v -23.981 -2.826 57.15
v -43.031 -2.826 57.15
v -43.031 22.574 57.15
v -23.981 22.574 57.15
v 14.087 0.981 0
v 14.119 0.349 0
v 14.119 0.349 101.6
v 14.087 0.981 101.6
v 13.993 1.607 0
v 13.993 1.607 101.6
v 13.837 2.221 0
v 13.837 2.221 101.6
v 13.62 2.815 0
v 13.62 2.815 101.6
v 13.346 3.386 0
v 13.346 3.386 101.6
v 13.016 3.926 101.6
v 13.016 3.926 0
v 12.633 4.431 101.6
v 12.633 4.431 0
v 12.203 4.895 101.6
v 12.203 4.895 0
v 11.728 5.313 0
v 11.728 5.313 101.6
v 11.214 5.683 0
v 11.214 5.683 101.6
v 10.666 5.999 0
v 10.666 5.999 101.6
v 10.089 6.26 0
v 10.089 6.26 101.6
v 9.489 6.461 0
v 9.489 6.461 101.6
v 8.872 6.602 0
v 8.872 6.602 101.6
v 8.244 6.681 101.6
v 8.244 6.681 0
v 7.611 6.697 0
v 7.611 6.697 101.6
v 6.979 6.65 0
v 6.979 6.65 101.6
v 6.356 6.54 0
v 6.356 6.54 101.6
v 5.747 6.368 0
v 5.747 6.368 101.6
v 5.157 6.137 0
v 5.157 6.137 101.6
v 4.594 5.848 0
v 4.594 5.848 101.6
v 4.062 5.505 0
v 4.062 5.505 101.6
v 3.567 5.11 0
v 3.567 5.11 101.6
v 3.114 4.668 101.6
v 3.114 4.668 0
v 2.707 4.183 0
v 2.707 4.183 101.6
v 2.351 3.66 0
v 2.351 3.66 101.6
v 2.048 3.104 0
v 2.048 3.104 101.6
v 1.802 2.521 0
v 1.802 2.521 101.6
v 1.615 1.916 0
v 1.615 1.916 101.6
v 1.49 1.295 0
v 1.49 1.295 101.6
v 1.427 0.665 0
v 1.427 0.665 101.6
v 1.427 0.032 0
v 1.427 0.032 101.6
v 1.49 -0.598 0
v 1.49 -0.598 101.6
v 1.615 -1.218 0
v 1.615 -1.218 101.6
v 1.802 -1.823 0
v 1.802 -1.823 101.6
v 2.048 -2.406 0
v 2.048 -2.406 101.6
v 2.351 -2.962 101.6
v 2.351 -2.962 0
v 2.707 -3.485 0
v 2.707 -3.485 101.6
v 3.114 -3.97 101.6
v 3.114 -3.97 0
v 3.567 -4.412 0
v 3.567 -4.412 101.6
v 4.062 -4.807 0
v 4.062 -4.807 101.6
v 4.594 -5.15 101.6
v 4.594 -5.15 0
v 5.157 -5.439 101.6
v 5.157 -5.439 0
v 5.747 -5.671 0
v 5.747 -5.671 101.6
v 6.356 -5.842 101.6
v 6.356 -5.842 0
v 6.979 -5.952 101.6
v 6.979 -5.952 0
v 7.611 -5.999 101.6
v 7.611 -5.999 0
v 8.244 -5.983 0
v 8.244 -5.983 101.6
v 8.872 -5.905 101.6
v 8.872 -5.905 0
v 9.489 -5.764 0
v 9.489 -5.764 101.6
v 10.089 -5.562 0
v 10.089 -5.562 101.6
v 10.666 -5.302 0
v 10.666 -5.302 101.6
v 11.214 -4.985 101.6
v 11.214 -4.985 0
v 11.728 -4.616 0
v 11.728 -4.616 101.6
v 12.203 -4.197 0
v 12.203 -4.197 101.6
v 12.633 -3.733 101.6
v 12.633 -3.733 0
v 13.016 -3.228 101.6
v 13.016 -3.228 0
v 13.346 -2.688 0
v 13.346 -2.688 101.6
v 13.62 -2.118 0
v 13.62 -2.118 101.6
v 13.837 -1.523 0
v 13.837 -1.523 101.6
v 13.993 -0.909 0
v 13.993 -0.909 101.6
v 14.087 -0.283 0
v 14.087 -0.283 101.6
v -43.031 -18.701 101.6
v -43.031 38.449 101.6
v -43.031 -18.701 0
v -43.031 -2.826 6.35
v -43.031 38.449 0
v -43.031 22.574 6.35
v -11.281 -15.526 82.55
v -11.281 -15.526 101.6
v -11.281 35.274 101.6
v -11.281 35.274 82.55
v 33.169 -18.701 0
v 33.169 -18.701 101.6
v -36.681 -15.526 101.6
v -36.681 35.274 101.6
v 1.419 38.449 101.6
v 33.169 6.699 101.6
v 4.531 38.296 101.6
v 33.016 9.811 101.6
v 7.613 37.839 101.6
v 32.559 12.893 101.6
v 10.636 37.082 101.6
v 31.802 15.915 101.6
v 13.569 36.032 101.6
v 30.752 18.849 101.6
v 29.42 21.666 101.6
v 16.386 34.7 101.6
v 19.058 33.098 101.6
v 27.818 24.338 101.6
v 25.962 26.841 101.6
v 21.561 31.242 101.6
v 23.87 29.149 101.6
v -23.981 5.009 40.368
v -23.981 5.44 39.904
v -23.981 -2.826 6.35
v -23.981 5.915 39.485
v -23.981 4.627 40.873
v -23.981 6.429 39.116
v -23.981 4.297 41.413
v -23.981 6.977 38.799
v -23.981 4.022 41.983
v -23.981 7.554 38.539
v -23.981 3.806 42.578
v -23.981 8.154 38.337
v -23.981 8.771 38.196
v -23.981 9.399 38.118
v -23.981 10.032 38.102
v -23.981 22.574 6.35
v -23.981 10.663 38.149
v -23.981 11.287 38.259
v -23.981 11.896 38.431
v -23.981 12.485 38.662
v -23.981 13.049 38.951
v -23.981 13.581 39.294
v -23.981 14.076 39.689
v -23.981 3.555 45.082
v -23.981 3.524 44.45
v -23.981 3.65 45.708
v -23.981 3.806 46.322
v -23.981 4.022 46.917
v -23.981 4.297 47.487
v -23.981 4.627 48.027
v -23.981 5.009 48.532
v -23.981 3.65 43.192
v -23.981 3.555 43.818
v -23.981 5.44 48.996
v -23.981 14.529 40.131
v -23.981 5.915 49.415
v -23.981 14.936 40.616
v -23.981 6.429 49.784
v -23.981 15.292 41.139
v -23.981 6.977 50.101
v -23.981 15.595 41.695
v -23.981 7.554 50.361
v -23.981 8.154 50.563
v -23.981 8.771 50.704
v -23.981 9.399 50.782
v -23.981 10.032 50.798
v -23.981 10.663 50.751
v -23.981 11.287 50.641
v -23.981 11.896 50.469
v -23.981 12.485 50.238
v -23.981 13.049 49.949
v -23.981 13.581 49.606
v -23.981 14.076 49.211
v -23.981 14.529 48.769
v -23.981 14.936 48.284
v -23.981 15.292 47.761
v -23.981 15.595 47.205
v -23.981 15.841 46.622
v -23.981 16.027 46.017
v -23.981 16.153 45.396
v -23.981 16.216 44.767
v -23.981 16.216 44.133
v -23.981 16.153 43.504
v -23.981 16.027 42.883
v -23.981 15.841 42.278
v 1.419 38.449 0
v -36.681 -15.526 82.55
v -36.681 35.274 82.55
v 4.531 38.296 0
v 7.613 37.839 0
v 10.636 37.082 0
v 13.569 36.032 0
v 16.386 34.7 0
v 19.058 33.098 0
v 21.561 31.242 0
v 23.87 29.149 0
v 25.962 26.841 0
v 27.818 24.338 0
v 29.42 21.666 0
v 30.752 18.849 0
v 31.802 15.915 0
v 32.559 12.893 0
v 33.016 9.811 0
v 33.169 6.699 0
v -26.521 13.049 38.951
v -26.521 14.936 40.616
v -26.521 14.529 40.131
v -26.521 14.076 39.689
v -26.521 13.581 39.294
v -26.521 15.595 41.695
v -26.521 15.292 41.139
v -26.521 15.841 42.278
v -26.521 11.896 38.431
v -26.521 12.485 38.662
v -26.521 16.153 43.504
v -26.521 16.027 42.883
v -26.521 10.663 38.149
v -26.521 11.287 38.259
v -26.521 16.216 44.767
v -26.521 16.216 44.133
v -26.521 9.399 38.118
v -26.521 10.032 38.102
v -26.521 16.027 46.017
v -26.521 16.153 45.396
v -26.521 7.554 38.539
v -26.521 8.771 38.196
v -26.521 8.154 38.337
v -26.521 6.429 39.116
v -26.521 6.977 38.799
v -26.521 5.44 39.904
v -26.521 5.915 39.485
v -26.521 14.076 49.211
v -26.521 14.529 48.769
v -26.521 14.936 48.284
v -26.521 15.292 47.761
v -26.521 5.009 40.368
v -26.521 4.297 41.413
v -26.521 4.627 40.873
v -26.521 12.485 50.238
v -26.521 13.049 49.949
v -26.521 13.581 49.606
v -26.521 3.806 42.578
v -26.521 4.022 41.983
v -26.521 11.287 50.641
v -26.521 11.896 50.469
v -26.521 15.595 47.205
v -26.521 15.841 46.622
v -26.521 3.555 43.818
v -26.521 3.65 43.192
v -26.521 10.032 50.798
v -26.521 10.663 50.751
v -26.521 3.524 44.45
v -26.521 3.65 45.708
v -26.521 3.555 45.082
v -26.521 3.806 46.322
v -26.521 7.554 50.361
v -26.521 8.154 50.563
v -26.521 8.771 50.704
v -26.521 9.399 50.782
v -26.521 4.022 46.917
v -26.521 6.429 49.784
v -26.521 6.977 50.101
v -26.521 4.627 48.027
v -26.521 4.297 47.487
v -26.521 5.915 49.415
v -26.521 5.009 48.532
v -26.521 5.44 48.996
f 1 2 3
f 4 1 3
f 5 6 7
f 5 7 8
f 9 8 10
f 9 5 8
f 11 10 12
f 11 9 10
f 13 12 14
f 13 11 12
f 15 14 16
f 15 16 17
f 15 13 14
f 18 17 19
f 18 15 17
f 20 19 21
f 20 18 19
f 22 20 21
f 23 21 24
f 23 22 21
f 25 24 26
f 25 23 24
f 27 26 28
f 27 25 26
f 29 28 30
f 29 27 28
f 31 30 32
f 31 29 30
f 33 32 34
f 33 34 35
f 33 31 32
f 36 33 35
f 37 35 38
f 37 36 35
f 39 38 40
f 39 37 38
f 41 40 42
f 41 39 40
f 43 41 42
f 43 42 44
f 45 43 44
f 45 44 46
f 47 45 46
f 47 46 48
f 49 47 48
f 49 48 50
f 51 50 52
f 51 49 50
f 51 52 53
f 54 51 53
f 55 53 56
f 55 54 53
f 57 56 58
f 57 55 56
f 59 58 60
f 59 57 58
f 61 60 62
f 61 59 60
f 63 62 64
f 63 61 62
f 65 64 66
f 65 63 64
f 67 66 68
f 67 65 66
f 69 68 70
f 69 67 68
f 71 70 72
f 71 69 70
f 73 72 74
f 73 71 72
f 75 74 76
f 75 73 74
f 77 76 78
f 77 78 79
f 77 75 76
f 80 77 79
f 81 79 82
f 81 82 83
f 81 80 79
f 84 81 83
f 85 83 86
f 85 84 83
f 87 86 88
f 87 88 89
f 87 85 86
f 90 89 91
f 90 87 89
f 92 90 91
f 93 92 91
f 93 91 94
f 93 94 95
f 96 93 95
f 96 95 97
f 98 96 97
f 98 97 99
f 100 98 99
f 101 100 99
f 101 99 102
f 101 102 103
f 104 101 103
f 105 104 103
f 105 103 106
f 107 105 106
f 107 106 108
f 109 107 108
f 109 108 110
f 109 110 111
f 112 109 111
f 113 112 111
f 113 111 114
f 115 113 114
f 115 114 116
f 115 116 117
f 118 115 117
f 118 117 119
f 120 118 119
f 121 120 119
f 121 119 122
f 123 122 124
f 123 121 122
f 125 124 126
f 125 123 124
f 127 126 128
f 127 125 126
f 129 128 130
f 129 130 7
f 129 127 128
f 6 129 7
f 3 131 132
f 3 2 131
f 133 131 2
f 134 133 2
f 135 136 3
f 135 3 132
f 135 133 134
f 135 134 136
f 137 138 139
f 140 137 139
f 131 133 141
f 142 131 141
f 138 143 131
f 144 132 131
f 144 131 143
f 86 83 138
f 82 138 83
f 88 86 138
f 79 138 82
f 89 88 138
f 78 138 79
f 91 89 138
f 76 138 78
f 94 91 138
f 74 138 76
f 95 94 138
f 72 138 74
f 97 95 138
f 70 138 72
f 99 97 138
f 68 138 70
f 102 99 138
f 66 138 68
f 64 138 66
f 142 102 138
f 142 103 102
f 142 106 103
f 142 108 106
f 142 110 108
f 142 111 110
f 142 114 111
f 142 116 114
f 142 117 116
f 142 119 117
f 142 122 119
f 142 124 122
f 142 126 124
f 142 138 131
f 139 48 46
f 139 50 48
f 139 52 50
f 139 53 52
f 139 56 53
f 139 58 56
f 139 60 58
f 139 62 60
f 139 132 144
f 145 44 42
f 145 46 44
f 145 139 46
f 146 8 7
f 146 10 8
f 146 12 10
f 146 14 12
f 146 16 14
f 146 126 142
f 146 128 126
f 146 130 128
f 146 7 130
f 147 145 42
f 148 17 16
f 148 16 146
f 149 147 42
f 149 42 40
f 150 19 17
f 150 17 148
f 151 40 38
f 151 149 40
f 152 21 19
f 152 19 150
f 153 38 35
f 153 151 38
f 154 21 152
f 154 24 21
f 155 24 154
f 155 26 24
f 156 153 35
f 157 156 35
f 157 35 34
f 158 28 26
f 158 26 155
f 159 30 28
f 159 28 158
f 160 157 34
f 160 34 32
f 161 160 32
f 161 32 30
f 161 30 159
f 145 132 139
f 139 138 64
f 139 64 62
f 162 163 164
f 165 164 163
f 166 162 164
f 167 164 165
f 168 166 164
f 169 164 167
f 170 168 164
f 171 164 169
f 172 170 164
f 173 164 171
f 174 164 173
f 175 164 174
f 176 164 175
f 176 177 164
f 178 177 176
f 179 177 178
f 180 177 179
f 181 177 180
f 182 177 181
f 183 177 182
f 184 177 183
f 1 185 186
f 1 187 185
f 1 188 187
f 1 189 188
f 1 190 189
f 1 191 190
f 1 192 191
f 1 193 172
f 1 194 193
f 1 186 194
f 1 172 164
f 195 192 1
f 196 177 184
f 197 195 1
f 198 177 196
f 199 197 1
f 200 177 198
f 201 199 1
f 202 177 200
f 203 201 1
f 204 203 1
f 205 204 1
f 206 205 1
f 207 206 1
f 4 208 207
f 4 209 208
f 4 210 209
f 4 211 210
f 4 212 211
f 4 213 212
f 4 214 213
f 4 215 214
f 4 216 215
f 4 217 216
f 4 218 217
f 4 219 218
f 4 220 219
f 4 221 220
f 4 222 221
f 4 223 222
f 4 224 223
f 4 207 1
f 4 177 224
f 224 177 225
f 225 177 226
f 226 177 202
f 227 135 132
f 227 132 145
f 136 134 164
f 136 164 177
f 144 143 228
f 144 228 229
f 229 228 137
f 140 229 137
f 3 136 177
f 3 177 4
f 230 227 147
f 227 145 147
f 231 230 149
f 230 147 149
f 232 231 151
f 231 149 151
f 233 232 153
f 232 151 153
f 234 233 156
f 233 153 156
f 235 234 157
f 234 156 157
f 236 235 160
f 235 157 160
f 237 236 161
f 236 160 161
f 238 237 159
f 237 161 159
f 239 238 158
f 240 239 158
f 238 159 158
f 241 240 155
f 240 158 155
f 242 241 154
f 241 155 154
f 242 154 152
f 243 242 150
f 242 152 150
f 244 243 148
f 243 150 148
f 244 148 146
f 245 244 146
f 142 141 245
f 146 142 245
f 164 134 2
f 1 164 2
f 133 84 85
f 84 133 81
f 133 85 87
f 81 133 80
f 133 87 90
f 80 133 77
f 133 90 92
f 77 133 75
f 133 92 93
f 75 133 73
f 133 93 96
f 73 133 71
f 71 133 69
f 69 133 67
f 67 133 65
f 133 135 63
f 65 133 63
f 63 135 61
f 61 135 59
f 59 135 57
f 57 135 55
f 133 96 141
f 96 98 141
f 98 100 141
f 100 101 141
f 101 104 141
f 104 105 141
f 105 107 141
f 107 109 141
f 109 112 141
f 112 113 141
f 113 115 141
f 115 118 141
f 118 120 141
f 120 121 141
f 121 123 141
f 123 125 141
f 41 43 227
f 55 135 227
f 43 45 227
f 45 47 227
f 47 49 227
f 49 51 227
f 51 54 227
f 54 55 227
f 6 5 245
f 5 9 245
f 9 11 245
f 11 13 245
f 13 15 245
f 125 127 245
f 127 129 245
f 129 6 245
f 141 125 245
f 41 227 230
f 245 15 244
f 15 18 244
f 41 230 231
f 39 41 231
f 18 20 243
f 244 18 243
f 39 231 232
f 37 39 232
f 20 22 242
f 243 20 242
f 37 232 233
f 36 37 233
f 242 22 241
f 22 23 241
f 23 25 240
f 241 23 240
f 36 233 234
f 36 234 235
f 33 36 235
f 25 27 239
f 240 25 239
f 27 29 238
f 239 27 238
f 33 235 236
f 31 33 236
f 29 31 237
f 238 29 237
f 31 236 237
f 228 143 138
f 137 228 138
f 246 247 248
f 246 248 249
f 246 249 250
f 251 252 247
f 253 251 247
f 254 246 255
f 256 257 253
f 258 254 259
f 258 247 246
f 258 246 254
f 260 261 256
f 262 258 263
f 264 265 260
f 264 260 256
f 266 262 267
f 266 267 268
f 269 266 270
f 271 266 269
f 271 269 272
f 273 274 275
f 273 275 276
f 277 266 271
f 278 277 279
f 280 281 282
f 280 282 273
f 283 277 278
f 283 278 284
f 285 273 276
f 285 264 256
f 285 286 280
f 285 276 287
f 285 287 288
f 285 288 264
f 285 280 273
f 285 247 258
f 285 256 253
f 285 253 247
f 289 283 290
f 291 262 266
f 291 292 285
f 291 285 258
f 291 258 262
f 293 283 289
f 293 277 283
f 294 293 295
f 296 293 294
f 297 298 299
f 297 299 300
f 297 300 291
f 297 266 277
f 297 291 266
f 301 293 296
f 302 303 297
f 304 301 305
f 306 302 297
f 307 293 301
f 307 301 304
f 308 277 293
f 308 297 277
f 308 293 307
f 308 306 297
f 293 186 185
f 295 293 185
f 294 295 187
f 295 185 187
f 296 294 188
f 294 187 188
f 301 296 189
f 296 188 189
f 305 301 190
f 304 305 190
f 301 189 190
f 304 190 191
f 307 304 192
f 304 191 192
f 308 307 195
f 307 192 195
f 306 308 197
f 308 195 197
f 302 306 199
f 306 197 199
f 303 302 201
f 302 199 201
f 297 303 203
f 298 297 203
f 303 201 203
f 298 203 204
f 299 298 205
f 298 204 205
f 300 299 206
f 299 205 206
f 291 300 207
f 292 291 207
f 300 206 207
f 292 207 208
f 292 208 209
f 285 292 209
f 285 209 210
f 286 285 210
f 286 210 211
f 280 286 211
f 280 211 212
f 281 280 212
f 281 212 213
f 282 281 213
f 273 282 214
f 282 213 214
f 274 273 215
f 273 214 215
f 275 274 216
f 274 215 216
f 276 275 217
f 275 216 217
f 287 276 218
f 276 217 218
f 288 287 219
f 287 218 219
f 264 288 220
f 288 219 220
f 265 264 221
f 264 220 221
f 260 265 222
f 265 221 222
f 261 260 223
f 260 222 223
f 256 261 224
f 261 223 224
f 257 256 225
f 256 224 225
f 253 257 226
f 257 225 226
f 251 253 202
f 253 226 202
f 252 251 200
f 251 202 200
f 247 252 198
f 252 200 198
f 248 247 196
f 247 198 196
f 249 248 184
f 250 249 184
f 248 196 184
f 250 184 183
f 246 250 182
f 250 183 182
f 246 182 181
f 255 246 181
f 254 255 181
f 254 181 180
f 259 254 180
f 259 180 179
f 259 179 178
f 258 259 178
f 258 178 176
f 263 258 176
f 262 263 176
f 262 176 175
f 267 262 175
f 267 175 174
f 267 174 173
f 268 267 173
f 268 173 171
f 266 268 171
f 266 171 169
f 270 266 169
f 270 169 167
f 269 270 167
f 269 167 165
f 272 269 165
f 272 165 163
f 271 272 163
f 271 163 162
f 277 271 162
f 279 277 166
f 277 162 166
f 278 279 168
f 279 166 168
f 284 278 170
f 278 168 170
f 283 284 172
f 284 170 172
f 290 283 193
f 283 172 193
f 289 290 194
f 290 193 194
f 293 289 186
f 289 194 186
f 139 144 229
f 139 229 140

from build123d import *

# Parameters (mm, degrees)
SKETCH1_W           = 76.2
SKETCH1_H           = 57.15
SKETCH1_R           = 6.35
BOSS_EXTRUDE1_DEPTH = 101.6
SKETCH2_W           = 50.8
SKETCH2_H           = 25.4
CUT_EXTRUDE1_DEPTH  = 19.05
SKETCH3_W           = 25.4
SKETCH3_H           = 50.8
CUT_EXTRUDE2_DEPTH  = 19.05
SKETCH4_R           = 6.35
BOSS_EXTRUDE2_DEPTH = 2.54
FILLET1_R           = 31.75


with BuildPart() as part:
    # Sketch1 → Boss-Extrude1 (new body)
    with BuildSketch(Plane.XY):
        with Locations((-4.930961298, 9.873813983)):
            Rectangle(SKETCH1_W, SKETCH1_H)
        with Locations((7.769038702, 0.348813983)):
            Circle(SKETCH1_R, mode=Mode.SUBTRACT)
    extrude(amount=BOSS_EXTRUDE1_DEPTH)

    # Sketch2 → Cut-Extrude1 (cut)
    with BuildSketch(Plane.ZY.offset(43.030961298)):
        with Locations((31.75, 9.873813983)):
            Rectangle(SKETCH2_W, SKETCH2_H)
    extrude(amount=-CUT_EXTRUDE1_DEPTH, mode=Mode.SUBTRACT)

    # Sketch3 → Cut-Extrude2 (cut)
    with BuildSketch(Plane.XY.offset(101.6)):
        with Locations((-23.980961298, 9.873813983)):
            Rectangle(SKETCH3_W, SKETCH3_H)
    extrude(amount=-CUT_EXTRUDE2_DEPTH, mode=Mode.SUBTRACT)

    # Sketch4 → Boss-Extrude2 (add)
    with BuildSketch(Plane.ZY.offset(23.980961298)):
        with Locations(Location((44.45, 9.873813983, 0), (0, 0, 270))):
            Circle(SKETCH4_R)
    extrude(amount=BOSS_EXTRUDE2_DEPTH)

    # Fillet1
    fillet1_edges = [part.edges().sort_by_distance(p)[0] for p in [
        (33.169038702, 38.448813983, 50.8),
    ]]
    fillet(fillet1_edges, radius=FILLET1_R)


solid = part.part
